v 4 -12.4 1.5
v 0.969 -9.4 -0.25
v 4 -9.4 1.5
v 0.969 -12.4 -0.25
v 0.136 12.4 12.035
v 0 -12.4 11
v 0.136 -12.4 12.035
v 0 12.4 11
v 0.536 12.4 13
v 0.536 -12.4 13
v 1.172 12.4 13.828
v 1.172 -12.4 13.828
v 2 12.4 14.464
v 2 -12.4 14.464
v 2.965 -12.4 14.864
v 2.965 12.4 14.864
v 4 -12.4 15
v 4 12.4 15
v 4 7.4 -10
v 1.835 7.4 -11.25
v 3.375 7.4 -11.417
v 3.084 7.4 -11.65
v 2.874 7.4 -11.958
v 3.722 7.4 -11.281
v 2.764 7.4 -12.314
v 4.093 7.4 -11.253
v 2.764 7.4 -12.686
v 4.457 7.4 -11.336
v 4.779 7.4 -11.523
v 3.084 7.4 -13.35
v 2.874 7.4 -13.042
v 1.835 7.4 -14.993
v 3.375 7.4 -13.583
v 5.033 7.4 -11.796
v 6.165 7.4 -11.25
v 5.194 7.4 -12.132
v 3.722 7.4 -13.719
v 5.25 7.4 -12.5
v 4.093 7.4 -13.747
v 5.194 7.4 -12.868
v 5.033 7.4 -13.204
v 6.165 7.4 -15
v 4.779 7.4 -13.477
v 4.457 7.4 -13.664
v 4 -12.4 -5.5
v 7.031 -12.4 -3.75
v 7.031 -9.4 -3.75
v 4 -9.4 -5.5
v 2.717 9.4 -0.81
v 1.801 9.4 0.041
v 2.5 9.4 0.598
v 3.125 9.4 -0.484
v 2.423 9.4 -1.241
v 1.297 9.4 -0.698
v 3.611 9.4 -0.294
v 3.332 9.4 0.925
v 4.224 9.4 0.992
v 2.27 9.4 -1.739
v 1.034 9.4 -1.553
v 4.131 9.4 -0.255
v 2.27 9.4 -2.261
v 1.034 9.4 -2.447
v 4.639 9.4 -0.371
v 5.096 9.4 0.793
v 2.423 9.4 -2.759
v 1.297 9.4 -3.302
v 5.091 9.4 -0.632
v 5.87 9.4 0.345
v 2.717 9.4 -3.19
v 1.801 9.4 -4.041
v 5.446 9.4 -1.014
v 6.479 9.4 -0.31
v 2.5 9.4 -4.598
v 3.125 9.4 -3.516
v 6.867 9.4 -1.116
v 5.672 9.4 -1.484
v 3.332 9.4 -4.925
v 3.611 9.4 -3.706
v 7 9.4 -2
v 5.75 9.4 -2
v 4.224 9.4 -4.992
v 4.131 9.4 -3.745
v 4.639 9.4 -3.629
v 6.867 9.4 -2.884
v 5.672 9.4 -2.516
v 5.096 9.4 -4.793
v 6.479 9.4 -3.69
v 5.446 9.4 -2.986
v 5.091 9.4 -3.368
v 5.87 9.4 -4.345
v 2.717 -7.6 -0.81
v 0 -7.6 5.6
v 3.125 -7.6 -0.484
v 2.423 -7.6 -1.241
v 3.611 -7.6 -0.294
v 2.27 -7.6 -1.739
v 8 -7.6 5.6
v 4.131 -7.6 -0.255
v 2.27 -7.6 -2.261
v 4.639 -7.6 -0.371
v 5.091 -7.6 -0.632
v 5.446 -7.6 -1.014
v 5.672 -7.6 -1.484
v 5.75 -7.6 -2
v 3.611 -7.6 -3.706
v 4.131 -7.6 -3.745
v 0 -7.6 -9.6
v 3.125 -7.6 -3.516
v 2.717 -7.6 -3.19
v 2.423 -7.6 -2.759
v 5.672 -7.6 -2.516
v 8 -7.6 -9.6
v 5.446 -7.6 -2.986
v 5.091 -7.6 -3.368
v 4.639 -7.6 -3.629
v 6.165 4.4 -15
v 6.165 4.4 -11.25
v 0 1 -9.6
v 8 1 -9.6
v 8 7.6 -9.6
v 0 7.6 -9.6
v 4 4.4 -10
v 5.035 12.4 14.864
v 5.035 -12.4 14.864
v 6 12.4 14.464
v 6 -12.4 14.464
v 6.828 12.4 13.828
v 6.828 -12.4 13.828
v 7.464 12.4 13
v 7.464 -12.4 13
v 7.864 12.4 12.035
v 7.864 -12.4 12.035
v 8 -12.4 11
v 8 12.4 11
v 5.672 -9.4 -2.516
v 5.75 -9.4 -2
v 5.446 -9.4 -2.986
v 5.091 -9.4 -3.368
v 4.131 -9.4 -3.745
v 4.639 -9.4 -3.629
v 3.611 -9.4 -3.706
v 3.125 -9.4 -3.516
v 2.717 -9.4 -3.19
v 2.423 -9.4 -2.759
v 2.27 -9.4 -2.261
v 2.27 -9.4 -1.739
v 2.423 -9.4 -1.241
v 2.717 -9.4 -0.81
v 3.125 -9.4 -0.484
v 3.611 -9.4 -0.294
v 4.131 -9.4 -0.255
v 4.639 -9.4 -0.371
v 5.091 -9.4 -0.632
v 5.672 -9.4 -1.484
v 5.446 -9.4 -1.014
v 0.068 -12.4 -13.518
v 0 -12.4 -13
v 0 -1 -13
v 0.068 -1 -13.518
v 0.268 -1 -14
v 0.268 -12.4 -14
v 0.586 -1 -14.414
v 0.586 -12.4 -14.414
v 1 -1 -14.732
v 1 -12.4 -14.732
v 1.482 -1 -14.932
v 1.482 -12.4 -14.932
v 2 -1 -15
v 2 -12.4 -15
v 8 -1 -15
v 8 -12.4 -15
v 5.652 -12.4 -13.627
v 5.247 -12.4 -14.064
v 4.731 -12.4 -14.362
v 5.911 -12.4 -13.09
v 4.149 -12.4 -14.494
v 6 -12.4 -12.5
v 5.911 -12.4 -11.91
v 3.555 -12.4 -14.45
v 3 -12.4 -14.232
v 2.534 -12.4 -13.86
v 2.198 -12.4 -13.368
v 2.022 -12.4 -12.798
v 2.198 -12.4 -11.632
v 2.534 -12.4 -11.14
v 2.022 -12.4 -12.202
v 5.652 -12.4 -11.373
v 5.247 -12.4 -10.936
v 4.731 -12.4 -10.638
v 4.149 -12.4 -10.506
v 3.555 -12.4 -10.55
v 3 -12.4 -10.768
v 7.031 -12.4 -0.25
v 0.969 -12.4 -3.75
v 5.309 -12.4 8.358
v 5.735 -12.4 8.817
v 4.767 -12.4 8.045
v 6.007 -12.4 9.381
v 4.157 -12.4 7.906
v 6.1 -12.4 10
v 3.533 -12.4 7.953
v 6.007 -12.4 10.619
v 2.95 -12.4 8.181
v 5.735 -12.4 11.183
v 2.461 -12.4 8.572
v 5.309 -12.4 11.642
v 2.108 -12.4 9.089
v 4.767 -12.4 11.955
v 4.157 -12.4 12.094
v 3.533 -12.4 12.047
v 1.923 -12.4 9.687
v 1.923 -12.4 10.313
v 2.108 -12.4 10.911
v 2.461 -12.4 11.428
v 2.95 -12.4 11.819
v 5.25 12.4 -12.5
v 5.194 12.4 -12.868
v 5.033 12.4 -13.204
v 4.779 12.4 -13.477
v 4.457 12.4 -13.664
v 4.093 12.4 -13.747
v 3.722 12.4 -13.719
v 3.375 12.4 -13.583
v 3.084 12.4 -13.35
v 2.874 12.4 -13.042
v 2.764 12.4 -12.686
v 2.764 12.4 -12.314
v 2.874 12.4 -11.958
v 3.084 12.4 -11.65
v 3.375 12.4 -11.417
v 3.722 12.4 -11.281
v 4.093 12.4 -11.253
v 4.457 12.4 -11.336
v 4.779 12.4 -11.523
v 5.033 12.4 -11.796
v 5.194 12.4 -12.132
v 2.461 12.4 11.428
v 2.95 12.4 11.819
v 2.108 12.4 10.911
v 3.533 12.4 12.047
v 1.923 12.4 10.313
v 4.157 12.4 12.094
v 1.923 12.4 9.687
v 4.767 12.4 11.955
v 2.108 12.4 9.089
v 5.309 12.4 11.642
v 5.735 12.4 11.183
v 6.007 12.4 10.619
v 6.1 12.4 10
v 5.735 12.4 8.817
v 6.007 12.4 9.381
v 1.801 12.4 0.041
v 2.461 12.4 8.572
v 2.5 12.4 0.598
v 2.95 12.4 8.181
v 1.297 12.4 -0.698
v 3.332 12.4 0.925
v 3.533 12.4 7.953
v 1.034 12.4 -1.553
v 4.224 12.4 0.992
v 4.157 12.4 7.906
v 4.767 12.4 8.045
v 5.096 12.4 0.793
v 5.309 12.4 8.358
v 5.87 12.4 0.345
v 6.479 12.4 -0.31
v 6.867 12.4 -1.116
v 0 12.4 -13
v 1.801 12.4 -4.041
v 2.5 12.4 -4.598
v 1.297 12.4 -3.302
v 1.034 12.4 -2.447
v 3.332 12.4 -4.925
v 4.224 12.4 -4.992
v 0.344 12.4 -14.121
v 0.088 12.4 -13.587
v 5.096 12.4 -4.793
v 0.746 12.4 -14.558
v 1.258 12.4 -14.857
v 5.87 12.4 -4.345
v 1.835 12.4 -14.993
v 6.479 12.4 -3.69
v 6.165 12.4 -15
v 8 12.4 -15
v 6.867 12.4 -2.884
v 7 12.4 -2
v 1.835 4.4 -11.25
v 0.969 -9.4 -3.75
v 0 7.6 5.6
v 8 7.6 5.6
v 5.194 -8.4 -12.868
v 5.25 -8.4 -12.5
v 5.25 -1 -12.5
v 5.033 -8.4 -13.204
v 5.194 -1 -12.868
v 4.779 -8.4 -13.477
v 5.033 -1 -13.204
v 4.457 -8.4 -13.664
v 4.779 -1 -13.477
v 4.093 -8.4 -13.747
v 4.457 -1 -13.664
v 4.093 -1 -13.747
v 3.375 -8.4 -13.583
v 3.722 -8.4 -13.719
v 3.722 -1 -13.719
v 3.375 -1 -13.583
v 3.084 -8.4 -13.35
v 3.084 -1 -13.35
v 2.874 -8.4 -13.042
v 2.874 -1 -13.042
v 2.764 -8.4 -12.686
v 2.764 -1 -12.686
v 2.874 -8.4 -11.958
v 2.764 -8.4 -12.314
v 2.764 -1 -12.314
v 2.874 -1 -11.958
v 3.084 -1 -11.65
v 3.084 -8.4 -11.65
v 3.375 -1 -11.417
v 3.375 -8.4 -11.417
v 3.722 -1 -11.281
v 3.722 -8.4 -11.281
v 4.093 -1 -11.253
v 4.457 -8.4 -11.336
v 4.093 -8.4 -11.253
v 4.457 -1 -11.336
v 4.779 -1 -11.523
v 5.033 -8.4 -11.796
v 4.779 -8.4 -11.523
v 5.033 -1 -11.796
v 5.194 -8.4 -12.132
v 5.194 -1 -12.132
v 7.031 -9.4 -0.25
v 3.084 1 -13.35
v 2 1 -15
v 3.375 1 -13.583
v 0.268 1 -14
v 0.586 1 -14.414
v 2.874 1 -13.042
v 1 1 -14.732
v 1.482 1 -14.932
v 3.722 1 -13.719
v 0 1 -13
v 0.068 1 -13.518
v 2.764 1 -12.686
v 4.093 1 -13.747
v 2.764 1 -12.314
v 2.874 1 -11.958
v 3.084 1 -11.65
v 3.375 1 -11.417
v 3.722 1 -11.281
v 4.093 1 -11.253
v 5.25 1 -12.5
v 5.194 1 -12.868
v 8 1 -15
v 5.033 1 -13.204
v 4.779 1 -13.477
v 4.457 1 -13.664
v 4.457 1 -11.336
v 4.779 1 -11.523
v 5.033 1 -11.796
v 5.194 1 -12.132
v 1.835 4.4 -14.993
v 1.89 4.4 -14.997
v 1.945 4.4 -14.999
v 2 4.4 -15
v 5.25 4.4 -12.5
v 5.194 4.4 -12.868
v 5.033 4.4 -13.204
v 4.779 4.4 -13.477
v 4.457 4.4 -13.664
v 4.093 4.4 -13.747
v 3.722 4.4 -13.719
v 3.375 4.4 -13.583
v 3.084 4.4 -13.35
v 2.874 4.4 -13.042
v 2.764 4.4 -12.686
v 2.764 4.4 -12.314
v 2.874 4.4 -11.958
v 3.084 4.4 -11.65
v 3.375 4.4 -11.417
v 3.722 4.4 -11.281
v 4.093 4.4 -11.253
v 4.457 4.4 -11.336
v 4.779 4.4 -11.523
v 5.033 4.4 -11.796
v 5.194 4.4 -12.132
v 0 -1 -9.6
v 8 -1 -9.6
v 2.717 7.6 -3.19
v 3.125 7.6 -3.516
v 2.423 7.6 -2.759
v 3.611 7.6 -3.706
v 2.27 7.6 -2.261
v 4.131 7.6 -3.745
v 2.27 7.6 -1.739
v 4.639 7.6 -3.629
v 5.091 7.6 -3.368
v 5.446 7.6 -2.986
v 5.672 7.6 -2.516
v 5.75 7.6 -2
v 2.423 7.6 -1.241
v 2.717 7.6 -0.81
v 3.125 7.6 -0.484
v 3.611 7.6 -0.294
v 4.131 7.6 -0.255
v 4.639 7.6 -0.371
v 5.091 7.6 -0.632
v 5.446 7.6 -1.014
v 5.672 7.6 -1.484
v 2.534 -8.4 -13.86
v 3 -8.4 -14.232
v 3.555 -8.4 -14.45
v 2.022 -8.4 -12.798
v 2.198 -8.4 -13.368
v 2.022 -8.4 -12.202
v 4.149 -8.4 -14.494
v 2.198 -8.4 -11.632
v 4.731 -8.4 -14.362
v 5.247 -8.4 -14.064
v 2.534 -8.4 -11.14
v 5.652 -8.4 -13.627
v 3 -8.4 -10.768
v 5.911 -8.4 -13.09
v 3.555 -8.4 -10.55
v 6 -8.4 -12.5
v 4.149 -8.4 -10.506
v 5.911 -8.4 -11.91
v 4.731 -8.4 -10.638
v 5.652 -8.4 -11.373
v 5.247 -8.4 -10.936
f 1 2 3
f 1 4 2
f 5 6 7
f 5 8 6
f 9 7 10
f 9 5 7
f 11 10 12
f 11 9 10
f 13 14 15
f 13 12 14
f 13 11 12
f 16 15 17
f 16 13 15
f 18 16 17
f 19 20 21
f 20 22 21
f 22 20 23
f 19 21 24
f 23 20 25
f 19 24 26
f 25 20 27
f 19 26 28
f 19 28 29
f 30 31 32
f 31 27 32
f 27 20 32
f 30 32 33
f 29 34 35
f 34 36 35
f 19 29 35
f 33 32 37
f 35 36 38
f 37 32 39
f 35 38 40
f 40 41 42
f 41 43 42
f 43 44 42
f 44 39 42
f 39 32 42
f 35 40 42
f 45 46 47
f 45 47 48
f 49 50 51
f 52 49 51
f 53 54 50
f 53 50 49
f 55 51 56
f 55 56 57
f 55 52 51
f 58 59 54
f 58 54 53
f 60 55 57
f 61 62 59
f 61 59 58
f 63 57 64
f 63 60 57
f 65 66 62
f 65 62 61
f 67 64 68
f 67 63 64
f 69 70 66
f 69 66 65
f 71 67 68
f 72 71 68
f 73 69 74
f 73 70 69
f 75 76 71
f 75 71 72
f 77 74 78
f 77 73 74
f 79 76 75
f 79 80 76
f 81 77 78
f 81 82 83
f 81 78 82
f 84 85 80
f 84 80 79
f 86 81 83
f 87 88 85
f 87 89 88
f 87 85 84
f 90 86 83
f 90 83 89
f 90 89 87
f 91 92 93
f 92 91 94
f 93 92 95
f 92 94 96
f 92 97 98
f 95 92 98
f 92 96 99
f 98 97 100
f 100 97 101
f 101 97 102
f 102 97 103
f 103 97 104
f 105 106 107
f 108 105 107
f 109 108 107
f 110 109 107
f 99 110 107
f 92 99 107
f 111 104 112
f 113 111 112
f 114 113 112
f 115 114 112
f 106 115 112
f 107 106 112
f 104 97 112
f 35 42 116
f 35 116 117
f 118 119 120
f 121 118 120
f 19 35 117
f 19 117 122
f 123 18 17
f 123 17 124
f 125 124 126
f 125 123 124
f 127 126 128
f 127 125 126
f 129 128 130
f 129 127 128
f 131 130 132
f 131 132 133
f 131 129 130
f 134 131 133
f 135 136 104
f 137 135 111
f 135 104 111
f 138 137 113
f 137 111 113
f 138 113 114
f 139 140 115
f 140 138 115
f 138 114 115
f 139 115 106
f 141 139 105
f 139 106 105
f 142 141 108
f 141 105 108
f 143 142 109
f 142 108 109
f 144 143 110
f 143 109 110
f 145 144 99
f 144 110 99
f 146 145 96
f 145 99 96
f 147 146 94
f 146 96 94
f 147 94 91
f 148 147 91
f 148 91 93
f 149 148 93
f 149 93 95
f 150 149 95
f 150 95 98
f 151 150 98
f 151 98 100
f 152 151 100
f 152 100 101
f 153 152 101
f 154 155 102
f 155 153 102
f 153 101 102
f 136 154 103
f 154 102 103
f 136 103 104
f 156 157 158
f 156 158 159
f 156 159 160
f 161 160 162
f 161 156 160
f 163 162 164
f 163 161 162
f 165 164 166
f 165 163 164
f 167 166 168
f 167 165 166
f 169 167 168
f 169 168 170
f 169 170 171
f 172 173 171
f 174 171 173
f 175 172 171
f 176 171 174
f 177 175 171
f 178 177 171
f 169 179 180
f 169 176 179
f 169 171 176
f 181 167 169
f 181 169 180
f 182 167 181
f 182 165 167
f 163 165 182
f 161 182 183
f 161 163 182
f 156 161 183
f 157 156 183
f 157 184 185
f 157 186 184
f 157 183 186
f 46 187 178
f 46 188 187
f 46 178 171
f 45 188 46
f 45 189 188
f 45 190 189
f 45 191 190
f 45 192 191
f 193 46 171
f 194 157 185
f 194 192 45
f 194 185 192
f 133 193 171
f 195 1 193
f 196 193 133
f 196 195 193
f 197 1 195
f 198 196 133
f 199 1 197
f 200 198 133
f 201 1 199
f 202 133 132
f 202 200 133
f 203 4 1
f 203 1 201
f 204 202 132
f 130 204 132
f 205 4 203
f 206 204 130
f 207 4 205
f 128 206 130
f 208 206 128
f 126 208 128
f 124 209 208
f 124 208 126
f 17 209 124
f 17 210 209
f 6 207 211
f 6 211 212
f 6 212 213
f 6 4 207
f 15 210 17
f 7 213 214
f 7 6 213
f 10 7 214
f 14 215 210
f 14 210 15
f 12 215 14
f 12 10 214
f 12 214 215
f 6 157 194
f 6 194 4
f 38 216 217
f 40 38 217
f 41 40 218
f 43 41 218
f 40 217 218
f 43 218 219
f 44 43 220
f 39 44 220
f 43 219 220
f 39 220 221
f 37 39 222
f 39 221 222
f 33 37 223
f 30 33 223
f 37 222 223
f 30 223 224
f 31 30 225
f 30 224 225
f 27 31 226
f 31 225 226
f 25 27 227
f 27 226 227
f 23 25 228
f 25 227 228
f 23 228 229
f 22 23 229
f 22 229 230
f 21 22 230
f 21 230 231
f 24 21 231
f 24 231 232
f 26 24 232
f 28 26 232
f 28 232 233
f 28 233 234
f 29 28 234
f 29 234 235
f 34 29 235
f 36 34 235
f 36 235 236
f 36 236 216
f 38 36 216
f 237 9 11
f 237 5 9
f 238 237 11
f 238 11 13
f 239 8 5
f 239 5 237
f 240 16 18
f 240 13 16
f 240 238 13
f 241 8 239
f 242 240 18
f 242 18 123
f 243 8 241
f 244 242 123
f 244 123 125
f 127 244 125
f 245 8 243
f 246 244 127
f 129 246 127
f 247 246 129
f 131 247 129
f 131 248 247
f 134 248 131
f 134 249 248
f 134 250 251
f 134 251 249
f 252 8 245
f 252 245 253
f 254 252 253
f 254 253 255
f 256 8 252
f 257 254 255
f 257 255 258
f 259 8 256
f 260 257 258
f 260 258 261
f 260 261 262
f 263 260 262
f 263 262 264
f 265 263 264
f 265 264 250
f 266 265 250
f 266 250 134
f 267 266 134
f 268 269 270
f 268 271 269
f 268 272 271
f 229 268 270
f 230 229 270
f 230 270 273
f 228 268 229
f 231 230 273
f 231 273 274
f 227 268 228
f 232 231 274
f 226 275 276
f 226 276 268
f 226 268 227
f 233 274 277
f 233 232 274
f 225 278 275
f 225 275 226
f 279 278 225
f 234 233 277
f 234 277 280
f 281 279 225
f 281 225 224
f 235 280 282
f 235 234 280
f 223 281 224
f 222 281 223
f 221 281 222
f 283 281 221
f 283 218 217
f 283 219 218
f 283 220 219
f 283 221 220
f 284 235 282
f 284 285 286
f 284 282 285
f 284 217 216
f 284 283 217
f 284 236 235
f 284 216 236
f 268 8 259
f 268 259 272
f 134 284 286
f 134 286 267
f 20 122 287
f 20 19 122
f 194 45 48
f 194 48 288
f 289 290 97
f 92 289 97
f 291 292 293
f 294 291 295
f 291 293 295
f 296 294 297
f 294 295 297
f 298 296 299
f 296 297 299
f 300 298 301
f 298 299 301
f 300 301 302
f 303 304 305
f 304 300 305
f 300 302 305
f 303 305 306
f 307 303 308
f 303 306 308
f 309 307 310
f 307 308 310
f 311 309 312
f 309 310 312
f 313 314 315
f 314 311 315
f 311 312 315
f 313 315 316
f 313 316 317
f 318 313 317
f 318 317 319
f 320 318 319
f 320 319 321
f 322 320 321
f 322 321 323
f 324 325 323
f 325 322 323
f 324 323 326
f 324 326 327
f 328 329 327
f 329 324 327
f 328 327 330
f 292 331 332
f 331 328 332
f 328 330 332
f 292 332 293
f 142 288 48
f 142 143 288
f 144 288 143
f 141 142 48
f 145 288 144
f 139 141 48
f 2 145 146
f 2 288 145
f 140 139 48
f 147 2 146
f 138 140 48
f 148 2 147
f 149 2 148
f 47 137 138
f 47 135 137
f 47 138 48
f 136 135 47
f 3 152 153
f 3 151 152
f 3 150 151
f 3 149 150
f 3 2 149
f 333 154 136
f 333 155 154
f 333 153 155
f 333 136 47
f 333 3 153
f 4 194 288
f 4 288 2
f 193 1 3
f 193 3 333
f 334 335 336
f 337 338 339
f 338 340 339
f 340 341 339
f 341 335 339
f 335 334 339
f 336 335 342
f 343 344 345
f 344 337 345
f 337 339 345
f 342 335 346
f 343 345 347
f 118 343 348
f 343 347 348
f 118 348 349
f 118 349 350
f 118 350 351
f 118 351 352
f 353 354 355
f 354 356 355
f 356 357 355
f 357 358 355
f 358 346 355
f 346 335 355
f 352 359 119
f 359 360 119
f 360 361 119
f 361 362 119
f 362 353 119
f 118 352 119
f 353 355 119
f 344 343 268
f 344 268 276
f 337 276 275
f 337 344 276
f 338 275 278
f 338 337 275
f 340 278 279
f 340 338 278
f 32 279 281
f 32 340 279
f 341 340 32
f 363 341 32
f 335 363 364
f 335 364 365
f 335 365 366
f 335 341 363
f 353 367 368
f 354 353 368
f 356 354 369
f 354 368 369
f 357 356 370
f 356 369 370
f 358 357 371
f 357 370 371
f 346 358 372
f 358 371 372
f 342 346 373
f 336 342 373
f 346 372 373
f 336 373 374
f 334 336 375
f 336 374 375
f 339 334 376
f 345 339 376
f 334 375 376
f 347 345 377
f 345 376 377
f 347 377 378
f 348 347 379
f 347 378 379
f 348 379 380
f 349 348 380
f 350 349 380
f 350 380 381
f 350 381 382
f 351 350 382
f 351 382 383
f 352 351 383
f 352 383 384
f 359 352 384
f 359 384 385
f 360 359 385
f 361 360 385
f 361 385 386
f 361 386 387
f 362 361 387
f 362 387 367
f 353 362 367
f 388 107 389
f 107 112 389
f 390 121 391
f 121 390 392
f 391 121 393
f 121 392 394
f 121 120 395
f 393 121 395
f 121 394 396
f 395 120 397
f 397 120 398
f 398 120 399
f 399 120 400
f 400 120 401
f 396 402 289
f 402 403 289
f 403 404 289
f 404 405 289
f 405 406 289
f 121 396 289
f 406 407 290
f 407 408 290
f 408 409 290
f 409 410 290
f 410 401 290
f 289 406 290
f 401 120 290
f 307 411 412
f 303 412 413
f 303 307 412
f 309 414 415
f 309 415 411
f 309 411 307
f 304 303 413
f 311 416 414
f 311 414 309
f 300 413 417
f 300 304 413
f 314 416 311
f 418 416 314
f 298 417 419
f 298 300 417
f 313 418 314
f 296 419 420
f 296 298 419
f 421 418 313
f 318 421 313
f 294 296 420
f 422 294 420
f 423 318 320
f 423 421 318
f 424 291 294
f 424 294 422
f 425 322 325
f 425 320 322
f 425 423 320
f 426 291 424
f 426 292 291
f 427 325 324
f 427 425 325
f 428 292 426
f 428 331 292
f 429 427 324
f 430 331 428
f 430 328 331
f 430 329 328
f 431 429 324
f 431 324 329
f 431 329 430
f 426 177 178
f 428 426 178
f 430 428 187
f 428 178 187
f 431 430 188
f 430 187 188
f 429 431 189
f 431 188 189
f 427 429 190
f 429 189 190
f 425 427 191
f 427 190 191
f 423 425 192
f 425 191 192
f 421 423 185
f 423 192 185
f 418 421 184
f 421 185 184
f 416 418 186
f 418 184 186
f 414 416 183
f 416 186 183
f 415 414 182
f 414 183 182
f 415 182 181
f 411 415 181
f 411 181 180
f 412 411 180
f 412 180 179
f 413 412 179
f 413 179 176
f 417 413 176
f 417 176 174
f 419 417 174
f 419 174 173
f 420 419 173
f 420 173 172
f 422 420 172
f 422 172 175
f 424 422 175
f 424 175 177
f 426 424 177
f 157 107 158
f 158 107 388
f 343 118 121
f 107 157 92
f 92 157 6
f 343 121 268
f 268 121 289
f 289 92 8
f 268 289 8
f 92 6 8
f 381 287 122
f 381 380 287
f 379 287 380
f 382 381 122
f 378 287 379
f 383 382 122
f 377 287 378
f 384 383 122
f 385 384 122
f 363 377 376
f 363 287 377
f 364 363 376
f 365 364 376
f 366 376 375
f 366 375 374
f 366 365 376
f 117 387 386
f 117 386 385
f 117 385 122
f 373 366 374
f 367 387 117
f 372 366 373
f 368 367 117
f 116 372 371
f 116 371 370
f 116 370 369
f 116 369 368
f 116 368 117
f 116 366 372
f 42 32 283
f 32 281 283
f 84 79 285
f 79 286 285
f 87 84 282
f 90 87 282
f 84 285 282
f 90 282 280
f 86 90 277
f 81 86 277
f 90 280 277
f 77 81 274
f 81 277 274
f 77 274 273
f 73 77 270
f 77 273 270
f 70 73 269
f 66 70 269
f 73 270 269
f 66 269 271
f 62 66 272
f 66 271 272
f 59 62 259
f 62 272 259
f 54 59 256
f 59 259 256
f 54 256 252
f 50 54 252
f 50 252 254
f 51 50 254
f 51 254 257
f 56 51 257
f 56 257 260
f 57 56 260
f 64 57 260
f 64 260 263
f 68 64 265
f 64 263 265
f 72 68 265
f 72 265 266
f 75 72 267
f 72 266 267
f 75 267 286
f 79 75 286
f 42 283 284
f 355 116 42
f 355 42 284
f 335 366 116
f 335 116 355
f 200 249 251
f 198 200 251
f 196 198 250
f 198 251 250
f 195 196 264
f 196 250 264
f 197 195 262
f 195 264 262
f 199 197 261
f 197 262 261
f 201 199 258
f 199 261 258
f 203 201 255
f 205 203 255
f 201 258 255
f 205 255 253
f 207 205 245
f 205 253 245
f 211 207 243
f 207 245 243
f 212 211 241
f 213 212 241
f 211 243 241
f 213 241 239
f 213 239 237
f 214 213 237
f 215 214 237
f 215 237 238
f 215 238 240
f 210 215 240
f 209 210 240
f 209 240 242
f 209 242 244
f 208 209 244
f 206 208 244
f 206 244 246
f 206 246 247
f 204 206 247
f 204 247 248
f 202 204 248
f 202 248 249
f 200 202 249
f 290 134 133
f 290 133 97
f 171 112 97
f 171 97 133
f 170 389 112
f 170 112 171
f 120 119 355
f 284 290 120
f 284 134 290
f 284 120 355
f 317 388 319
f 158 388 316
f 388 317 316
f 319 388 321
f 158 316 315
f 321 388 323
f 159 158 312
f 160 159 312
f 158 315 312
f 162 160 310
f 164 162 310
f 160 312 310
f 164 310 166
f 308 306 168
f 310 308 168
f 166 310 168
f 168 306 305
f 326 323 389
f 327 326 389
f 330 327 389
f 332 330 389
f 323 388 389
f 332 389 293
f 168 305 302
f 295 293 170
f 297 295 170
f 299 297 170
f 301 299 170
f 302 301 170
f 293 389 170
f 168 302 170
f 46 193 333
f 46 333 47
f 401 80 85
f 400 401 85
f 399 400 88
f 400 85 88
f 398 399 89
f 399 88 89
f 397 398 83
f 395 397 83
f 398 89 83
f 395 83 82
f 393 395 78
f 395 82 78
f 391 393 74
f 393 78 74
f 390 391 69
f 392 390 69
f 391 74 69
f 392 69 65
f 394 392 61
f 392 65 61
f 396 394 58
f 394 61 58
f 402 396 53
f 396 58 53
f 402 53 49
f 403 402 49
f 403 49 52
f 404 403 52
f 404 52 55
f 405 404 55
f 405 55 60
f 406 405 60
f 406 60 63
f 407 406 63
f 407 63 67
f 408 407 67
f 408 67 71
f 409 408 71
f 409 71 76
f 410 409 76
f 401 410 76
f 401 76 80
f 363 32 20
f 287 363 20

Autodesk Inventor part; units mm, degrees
ref_plane "YZ Plane" through (0, 0, 0) normal (1, 0, 0) x (0, 1, 0)
ref_plane "XZ Plane" through (0, 0, 0) normal (0, 1, 0) x (-1, 0, 0)
ref_plane "XY Plane" through (0, 0, 0) normal (0, 0, 1) x (1, 0, 0)
sketch "Sketch1" plane through (0, 0, 0) normal (1, 0, 0) x (0, 1, 0)
  line L0 (-12.4, 15) -> (12.4, 15)
  line L1 (12.4, 15) -> (12.4, -15)
  line L2 (12.4, -15) -> (-12.4, -15)
  line L3 (-12.4, -15) -> (-12.4, 15)
  line L4 (-12.4, 15) -> (12.4, -15) construction
  line L5 (12.4, 15) -> (-12.4, -15) construction
  line L6 (0, -15) -> (0, -1.5)
  circle A0 centre (0, -1.5) radius 8
  point P0 (0, 0)
  dimension "d0" = 24.8
  dimension "d1" = 30
  dimension "d2" = 13.5
  dimension "d3" = 16
extrude "Extrusion1" add sketch "Sketch1" along normal blind 8
sketch "Sketch3" plane through (0, 12.4, 15) normal (0, 1, 0) x (1, 0, 0)
  line L0 (0, 0) -> (8, 0) projected
  line L1 (4, 0) -> (4, 5)
  circle A0 centre (4, 5) radius 2.1
  point P0 (0, 15)
  dimension "d9" = 5
  dimension "d10" = 4.2
extrude "Extrusion3" cut sketch "Sketch3" against normal up to next
sketch "Sketch4" plane through (0, 12.4, 15) normal (0, 1, 0) x (1, 0, 0)
  line L0 (0, 30) -> (8, 30) projected
  line L1 (4, 30) -> (4, 27.5)
  circle A0 centre (4, 27.5) radius 1.25
  point P0 (0, 15)
  dimension "d13" = 2.5
  dimension "d14" = 2.5
extrude "Extrusion4" cut sketch "Sketch4" against normal through all
fillet "Fillet1" radius 4 2 edges at (0, 0, 15) (8, 0, 15)
fillet "Fillet2" radius 2 1 edges at (0, 0, -15)
sketch "Sketch5" plane through (8, 0, 0) normal (1, 0, 0) x (0, 0, -1)
  arc A0 (1.5, 8) -> (1.5, 8) centre (1.5, 0) ccw projected
  circle A1 centre (1.5, 0) radius 8
  point P0 (0, 0)
extrude "Extrusion5" add sketch "Sketch5" against normal blind 8
sketch "Sketch6" plane through (8, 0, 0) normal (1, 0, 0) x (0, 0, -1)
  line L0 (-5.6, -7.6) -> (9.6, -7.6)
  line L1 (9.6, -7.6) -> (9.6, 7.6)
  line L2 (9.6, 7.6) -> (-5.6, 7.6)
  line L3 (-5.6, 7.6) -> (-5.6, -7.6)
  line L4 (-5.6, -7.6) -> (9.6, 7.6) construction
  line L5 (9.6, -7.6) -> (-5.6, 7.6) construction
  point P0 (0, 0)
  point P1 (2, 0)
  dimension "d22" = 15.2
  dimension "d23" = 15.2
  dimension "d24" = 2
extrude "Extrusion6" cut sketch "Sketch6" against normal up to next
sketch "Sketch7" plane through (8, 0, 0) normal (1, 0, 0) x (0, 0, -1)
  line L0 (8.4724, -1) -> (16.4136, -1)
  line L1 (16.4136, -1) -> (16.4136, 1)
  line L2 (16.4136, 1) -> (8.4724, 1)
  line L3 (8.4724, 1) -> (8.4724, -1)
  line L4 (8.4724, -1) -> (16.4136, 1) construction
  line L5 (16.4136, -1) -> (8.4724, 1) construction
  point P0 (0, 0)
  point P1 (12.443, 0)
  dimension "d27" = 2
extrude "Extrusion7" cut sketch "Sketch7" against normal through all
sketch "Sketch8" plane through (4, 12.4, 11) normal (0, 1, 0) x (1, 0, 0)
  circle A0 centre (0, 23.5) radius 1.25 projected
  line L0 (0, 26) -> (2.1651, 24.75)
  line L1 (2.1651, 24.75) -> (2.1651, 22.25)
  line L2 (2.1651, 22.25) -> (0, 21)
  line L3 (0, 21) -> (-2.1651, 22.25)
  line L4 (-2.1651, 22.25) -> (-2.1651, 24.75)
  line L5 (-2.1651, 24.75) -> (0, 26)
  point P0 (-4, 11)
  dimension "d30" = 2.5
extrude "Extrusion8" cut sketch "Sketch8" against normal blind 8
sketch "Sketch9" plane through (4, 4.4, -10) normal (0.5, 0, -0.8660254) x (-0.8660254, 0, -0.5)
  point P0 (-1.5359, -4.4)
sketch "Sketch10" plane through (4, 12.4, 11) normal (0, 1, 0) x (1, 0, 0)
  line L0 (-2.1651, 24.75) -> (0, 26) projected
  line L1 (2.1651, 27.25) -> (-2.1651, 27.25)
  line L2 (-2.1651, 27.25) -> (-2.1651, 24.75)
  line L3 (-2.1651, 24.75) -> (2.1651, 24.75)
  line L4 (2.1651, 24.75) -> (2.1651, 27.25)
  line L5 (0, 26) -> (2.1651, 24.75) projected
  line L6 (2.1651, 27.25) -> (-2.1651, 24.75) construction
  line L7 (-2.1651, 27.25) -> (2.1651, 24.75) construction
  point P0 (-4, 11)
extrude "Extrusion9" cut sketch "Sketch10" against normal blind 8
sketch "Sketch11" plane through (4, 12.4, 11) normal (0, 1, 0) x (1, 0, 0)
  line L0 (2.1651, 22.25) -> (0, 21) projected
  line L1 (0, 21) -> (-2.1651, 22.25)
  arc A0 (-2.1651, 25.9932) -> (-4, 24) centre (-2, 24) ccw projected
  line L2 (-4, 24) -> (-2.1651, 22.25)
  arc A1 (-2.1651, 25.9932) -> (-4, 24) centre (-2, 24) ccw
  line L3 (-2.1651, 25.9932) -> (2.1651, 26)
  line L4 (2.1651, 22.25) -> (0, 21) projected
  line L5 (2.1651, 26) -> (2.1651, 22.25)
  line L6 (2.1651, 22.25) -> (0, 21)
  circle A2 centre (0, 23.5) radius 1.25 projected
  circle A3 centre (0, 23.5) radius 1.25
  point P0 (-4, 11)
extrude "Extrusion10" add sketch "Sketch11" against normal blind 5
sketch "Sketch12" plane through (4, -12.4, 11) normal (0, -1, 0) x (1, 0, 0)
  circle A0 centre (0, -23.5) radius 1.25 projected
  circle A1 centre (0, -23.5) radius 2
  point P0 (-4, -11)
  dimension "d37" = 4
extrude "Extrusion11" cut sketch "Sketch12" against normal blind 4
sketch "Sketch13" plane through (4, 12.4, 11) normal (0, 1, 0) x (1, 0, 0)
  line L0 (-2, 26) -> (4, 26) projected
  line L1 (4, 26) -> (0, 26)
  line L2 (0, 26) -> (0, 13)
  line L3 (0, 13) -> (4, 13)
  line L4 (4, 13) -> (4, 26)
  circle A0 centre (0, 13) radius 1.75
  point P0 (-4, 11)
  dimension "d40" = 4
  dimension "d41" = 13
  dimension "d42" = 3.5
extrude "Extrusion12" cut sketch "Sketch13" against normal through all contours A0 L3 L2 | L2 L3 A0
sketch "Sketch14" plane through (4, -12.4, 11) normal (0, -1, 0) x (1, 0, 0)
  circle A0 centre (0, -13) radius 1.75 projected
  line L0 (0, -16.5) -> (-3.0311, -14.75)
  line L1 (-3.0311, -14.75) -> (-3.0311, -11.25)
  line L2 (-3.0311, -11.25) -> (0, -9.5)
  line L3 (0, -9.5) -> (3.0311, -11.25)
  line L4 (3.0311, -11.25) -> (3.0311, -14.75)
  line L5 (3.0311, -14.75) -> (0, -16.5)
  point P0 (-4, -11)
  dimension "d45" = 3.5
extrude "Extrusion13" cut sketch "Sketch14" against normal blind 3
sketch "Sketch15" plane through (4, 12.4, 11) normal (0, 1, 0) x (1, 0, 0)
  circle A0 centre (0, 13) radius 1.75 projected
  circle A1 centre (0, 13) radius 3
  point P0 (-4, 11)
  dimension "d48" = 6
extrude "Extrusion14" cut sketch "Sketch15" against normal blind 3
properties part number "arm_grip" material "Nylon 6/6"
